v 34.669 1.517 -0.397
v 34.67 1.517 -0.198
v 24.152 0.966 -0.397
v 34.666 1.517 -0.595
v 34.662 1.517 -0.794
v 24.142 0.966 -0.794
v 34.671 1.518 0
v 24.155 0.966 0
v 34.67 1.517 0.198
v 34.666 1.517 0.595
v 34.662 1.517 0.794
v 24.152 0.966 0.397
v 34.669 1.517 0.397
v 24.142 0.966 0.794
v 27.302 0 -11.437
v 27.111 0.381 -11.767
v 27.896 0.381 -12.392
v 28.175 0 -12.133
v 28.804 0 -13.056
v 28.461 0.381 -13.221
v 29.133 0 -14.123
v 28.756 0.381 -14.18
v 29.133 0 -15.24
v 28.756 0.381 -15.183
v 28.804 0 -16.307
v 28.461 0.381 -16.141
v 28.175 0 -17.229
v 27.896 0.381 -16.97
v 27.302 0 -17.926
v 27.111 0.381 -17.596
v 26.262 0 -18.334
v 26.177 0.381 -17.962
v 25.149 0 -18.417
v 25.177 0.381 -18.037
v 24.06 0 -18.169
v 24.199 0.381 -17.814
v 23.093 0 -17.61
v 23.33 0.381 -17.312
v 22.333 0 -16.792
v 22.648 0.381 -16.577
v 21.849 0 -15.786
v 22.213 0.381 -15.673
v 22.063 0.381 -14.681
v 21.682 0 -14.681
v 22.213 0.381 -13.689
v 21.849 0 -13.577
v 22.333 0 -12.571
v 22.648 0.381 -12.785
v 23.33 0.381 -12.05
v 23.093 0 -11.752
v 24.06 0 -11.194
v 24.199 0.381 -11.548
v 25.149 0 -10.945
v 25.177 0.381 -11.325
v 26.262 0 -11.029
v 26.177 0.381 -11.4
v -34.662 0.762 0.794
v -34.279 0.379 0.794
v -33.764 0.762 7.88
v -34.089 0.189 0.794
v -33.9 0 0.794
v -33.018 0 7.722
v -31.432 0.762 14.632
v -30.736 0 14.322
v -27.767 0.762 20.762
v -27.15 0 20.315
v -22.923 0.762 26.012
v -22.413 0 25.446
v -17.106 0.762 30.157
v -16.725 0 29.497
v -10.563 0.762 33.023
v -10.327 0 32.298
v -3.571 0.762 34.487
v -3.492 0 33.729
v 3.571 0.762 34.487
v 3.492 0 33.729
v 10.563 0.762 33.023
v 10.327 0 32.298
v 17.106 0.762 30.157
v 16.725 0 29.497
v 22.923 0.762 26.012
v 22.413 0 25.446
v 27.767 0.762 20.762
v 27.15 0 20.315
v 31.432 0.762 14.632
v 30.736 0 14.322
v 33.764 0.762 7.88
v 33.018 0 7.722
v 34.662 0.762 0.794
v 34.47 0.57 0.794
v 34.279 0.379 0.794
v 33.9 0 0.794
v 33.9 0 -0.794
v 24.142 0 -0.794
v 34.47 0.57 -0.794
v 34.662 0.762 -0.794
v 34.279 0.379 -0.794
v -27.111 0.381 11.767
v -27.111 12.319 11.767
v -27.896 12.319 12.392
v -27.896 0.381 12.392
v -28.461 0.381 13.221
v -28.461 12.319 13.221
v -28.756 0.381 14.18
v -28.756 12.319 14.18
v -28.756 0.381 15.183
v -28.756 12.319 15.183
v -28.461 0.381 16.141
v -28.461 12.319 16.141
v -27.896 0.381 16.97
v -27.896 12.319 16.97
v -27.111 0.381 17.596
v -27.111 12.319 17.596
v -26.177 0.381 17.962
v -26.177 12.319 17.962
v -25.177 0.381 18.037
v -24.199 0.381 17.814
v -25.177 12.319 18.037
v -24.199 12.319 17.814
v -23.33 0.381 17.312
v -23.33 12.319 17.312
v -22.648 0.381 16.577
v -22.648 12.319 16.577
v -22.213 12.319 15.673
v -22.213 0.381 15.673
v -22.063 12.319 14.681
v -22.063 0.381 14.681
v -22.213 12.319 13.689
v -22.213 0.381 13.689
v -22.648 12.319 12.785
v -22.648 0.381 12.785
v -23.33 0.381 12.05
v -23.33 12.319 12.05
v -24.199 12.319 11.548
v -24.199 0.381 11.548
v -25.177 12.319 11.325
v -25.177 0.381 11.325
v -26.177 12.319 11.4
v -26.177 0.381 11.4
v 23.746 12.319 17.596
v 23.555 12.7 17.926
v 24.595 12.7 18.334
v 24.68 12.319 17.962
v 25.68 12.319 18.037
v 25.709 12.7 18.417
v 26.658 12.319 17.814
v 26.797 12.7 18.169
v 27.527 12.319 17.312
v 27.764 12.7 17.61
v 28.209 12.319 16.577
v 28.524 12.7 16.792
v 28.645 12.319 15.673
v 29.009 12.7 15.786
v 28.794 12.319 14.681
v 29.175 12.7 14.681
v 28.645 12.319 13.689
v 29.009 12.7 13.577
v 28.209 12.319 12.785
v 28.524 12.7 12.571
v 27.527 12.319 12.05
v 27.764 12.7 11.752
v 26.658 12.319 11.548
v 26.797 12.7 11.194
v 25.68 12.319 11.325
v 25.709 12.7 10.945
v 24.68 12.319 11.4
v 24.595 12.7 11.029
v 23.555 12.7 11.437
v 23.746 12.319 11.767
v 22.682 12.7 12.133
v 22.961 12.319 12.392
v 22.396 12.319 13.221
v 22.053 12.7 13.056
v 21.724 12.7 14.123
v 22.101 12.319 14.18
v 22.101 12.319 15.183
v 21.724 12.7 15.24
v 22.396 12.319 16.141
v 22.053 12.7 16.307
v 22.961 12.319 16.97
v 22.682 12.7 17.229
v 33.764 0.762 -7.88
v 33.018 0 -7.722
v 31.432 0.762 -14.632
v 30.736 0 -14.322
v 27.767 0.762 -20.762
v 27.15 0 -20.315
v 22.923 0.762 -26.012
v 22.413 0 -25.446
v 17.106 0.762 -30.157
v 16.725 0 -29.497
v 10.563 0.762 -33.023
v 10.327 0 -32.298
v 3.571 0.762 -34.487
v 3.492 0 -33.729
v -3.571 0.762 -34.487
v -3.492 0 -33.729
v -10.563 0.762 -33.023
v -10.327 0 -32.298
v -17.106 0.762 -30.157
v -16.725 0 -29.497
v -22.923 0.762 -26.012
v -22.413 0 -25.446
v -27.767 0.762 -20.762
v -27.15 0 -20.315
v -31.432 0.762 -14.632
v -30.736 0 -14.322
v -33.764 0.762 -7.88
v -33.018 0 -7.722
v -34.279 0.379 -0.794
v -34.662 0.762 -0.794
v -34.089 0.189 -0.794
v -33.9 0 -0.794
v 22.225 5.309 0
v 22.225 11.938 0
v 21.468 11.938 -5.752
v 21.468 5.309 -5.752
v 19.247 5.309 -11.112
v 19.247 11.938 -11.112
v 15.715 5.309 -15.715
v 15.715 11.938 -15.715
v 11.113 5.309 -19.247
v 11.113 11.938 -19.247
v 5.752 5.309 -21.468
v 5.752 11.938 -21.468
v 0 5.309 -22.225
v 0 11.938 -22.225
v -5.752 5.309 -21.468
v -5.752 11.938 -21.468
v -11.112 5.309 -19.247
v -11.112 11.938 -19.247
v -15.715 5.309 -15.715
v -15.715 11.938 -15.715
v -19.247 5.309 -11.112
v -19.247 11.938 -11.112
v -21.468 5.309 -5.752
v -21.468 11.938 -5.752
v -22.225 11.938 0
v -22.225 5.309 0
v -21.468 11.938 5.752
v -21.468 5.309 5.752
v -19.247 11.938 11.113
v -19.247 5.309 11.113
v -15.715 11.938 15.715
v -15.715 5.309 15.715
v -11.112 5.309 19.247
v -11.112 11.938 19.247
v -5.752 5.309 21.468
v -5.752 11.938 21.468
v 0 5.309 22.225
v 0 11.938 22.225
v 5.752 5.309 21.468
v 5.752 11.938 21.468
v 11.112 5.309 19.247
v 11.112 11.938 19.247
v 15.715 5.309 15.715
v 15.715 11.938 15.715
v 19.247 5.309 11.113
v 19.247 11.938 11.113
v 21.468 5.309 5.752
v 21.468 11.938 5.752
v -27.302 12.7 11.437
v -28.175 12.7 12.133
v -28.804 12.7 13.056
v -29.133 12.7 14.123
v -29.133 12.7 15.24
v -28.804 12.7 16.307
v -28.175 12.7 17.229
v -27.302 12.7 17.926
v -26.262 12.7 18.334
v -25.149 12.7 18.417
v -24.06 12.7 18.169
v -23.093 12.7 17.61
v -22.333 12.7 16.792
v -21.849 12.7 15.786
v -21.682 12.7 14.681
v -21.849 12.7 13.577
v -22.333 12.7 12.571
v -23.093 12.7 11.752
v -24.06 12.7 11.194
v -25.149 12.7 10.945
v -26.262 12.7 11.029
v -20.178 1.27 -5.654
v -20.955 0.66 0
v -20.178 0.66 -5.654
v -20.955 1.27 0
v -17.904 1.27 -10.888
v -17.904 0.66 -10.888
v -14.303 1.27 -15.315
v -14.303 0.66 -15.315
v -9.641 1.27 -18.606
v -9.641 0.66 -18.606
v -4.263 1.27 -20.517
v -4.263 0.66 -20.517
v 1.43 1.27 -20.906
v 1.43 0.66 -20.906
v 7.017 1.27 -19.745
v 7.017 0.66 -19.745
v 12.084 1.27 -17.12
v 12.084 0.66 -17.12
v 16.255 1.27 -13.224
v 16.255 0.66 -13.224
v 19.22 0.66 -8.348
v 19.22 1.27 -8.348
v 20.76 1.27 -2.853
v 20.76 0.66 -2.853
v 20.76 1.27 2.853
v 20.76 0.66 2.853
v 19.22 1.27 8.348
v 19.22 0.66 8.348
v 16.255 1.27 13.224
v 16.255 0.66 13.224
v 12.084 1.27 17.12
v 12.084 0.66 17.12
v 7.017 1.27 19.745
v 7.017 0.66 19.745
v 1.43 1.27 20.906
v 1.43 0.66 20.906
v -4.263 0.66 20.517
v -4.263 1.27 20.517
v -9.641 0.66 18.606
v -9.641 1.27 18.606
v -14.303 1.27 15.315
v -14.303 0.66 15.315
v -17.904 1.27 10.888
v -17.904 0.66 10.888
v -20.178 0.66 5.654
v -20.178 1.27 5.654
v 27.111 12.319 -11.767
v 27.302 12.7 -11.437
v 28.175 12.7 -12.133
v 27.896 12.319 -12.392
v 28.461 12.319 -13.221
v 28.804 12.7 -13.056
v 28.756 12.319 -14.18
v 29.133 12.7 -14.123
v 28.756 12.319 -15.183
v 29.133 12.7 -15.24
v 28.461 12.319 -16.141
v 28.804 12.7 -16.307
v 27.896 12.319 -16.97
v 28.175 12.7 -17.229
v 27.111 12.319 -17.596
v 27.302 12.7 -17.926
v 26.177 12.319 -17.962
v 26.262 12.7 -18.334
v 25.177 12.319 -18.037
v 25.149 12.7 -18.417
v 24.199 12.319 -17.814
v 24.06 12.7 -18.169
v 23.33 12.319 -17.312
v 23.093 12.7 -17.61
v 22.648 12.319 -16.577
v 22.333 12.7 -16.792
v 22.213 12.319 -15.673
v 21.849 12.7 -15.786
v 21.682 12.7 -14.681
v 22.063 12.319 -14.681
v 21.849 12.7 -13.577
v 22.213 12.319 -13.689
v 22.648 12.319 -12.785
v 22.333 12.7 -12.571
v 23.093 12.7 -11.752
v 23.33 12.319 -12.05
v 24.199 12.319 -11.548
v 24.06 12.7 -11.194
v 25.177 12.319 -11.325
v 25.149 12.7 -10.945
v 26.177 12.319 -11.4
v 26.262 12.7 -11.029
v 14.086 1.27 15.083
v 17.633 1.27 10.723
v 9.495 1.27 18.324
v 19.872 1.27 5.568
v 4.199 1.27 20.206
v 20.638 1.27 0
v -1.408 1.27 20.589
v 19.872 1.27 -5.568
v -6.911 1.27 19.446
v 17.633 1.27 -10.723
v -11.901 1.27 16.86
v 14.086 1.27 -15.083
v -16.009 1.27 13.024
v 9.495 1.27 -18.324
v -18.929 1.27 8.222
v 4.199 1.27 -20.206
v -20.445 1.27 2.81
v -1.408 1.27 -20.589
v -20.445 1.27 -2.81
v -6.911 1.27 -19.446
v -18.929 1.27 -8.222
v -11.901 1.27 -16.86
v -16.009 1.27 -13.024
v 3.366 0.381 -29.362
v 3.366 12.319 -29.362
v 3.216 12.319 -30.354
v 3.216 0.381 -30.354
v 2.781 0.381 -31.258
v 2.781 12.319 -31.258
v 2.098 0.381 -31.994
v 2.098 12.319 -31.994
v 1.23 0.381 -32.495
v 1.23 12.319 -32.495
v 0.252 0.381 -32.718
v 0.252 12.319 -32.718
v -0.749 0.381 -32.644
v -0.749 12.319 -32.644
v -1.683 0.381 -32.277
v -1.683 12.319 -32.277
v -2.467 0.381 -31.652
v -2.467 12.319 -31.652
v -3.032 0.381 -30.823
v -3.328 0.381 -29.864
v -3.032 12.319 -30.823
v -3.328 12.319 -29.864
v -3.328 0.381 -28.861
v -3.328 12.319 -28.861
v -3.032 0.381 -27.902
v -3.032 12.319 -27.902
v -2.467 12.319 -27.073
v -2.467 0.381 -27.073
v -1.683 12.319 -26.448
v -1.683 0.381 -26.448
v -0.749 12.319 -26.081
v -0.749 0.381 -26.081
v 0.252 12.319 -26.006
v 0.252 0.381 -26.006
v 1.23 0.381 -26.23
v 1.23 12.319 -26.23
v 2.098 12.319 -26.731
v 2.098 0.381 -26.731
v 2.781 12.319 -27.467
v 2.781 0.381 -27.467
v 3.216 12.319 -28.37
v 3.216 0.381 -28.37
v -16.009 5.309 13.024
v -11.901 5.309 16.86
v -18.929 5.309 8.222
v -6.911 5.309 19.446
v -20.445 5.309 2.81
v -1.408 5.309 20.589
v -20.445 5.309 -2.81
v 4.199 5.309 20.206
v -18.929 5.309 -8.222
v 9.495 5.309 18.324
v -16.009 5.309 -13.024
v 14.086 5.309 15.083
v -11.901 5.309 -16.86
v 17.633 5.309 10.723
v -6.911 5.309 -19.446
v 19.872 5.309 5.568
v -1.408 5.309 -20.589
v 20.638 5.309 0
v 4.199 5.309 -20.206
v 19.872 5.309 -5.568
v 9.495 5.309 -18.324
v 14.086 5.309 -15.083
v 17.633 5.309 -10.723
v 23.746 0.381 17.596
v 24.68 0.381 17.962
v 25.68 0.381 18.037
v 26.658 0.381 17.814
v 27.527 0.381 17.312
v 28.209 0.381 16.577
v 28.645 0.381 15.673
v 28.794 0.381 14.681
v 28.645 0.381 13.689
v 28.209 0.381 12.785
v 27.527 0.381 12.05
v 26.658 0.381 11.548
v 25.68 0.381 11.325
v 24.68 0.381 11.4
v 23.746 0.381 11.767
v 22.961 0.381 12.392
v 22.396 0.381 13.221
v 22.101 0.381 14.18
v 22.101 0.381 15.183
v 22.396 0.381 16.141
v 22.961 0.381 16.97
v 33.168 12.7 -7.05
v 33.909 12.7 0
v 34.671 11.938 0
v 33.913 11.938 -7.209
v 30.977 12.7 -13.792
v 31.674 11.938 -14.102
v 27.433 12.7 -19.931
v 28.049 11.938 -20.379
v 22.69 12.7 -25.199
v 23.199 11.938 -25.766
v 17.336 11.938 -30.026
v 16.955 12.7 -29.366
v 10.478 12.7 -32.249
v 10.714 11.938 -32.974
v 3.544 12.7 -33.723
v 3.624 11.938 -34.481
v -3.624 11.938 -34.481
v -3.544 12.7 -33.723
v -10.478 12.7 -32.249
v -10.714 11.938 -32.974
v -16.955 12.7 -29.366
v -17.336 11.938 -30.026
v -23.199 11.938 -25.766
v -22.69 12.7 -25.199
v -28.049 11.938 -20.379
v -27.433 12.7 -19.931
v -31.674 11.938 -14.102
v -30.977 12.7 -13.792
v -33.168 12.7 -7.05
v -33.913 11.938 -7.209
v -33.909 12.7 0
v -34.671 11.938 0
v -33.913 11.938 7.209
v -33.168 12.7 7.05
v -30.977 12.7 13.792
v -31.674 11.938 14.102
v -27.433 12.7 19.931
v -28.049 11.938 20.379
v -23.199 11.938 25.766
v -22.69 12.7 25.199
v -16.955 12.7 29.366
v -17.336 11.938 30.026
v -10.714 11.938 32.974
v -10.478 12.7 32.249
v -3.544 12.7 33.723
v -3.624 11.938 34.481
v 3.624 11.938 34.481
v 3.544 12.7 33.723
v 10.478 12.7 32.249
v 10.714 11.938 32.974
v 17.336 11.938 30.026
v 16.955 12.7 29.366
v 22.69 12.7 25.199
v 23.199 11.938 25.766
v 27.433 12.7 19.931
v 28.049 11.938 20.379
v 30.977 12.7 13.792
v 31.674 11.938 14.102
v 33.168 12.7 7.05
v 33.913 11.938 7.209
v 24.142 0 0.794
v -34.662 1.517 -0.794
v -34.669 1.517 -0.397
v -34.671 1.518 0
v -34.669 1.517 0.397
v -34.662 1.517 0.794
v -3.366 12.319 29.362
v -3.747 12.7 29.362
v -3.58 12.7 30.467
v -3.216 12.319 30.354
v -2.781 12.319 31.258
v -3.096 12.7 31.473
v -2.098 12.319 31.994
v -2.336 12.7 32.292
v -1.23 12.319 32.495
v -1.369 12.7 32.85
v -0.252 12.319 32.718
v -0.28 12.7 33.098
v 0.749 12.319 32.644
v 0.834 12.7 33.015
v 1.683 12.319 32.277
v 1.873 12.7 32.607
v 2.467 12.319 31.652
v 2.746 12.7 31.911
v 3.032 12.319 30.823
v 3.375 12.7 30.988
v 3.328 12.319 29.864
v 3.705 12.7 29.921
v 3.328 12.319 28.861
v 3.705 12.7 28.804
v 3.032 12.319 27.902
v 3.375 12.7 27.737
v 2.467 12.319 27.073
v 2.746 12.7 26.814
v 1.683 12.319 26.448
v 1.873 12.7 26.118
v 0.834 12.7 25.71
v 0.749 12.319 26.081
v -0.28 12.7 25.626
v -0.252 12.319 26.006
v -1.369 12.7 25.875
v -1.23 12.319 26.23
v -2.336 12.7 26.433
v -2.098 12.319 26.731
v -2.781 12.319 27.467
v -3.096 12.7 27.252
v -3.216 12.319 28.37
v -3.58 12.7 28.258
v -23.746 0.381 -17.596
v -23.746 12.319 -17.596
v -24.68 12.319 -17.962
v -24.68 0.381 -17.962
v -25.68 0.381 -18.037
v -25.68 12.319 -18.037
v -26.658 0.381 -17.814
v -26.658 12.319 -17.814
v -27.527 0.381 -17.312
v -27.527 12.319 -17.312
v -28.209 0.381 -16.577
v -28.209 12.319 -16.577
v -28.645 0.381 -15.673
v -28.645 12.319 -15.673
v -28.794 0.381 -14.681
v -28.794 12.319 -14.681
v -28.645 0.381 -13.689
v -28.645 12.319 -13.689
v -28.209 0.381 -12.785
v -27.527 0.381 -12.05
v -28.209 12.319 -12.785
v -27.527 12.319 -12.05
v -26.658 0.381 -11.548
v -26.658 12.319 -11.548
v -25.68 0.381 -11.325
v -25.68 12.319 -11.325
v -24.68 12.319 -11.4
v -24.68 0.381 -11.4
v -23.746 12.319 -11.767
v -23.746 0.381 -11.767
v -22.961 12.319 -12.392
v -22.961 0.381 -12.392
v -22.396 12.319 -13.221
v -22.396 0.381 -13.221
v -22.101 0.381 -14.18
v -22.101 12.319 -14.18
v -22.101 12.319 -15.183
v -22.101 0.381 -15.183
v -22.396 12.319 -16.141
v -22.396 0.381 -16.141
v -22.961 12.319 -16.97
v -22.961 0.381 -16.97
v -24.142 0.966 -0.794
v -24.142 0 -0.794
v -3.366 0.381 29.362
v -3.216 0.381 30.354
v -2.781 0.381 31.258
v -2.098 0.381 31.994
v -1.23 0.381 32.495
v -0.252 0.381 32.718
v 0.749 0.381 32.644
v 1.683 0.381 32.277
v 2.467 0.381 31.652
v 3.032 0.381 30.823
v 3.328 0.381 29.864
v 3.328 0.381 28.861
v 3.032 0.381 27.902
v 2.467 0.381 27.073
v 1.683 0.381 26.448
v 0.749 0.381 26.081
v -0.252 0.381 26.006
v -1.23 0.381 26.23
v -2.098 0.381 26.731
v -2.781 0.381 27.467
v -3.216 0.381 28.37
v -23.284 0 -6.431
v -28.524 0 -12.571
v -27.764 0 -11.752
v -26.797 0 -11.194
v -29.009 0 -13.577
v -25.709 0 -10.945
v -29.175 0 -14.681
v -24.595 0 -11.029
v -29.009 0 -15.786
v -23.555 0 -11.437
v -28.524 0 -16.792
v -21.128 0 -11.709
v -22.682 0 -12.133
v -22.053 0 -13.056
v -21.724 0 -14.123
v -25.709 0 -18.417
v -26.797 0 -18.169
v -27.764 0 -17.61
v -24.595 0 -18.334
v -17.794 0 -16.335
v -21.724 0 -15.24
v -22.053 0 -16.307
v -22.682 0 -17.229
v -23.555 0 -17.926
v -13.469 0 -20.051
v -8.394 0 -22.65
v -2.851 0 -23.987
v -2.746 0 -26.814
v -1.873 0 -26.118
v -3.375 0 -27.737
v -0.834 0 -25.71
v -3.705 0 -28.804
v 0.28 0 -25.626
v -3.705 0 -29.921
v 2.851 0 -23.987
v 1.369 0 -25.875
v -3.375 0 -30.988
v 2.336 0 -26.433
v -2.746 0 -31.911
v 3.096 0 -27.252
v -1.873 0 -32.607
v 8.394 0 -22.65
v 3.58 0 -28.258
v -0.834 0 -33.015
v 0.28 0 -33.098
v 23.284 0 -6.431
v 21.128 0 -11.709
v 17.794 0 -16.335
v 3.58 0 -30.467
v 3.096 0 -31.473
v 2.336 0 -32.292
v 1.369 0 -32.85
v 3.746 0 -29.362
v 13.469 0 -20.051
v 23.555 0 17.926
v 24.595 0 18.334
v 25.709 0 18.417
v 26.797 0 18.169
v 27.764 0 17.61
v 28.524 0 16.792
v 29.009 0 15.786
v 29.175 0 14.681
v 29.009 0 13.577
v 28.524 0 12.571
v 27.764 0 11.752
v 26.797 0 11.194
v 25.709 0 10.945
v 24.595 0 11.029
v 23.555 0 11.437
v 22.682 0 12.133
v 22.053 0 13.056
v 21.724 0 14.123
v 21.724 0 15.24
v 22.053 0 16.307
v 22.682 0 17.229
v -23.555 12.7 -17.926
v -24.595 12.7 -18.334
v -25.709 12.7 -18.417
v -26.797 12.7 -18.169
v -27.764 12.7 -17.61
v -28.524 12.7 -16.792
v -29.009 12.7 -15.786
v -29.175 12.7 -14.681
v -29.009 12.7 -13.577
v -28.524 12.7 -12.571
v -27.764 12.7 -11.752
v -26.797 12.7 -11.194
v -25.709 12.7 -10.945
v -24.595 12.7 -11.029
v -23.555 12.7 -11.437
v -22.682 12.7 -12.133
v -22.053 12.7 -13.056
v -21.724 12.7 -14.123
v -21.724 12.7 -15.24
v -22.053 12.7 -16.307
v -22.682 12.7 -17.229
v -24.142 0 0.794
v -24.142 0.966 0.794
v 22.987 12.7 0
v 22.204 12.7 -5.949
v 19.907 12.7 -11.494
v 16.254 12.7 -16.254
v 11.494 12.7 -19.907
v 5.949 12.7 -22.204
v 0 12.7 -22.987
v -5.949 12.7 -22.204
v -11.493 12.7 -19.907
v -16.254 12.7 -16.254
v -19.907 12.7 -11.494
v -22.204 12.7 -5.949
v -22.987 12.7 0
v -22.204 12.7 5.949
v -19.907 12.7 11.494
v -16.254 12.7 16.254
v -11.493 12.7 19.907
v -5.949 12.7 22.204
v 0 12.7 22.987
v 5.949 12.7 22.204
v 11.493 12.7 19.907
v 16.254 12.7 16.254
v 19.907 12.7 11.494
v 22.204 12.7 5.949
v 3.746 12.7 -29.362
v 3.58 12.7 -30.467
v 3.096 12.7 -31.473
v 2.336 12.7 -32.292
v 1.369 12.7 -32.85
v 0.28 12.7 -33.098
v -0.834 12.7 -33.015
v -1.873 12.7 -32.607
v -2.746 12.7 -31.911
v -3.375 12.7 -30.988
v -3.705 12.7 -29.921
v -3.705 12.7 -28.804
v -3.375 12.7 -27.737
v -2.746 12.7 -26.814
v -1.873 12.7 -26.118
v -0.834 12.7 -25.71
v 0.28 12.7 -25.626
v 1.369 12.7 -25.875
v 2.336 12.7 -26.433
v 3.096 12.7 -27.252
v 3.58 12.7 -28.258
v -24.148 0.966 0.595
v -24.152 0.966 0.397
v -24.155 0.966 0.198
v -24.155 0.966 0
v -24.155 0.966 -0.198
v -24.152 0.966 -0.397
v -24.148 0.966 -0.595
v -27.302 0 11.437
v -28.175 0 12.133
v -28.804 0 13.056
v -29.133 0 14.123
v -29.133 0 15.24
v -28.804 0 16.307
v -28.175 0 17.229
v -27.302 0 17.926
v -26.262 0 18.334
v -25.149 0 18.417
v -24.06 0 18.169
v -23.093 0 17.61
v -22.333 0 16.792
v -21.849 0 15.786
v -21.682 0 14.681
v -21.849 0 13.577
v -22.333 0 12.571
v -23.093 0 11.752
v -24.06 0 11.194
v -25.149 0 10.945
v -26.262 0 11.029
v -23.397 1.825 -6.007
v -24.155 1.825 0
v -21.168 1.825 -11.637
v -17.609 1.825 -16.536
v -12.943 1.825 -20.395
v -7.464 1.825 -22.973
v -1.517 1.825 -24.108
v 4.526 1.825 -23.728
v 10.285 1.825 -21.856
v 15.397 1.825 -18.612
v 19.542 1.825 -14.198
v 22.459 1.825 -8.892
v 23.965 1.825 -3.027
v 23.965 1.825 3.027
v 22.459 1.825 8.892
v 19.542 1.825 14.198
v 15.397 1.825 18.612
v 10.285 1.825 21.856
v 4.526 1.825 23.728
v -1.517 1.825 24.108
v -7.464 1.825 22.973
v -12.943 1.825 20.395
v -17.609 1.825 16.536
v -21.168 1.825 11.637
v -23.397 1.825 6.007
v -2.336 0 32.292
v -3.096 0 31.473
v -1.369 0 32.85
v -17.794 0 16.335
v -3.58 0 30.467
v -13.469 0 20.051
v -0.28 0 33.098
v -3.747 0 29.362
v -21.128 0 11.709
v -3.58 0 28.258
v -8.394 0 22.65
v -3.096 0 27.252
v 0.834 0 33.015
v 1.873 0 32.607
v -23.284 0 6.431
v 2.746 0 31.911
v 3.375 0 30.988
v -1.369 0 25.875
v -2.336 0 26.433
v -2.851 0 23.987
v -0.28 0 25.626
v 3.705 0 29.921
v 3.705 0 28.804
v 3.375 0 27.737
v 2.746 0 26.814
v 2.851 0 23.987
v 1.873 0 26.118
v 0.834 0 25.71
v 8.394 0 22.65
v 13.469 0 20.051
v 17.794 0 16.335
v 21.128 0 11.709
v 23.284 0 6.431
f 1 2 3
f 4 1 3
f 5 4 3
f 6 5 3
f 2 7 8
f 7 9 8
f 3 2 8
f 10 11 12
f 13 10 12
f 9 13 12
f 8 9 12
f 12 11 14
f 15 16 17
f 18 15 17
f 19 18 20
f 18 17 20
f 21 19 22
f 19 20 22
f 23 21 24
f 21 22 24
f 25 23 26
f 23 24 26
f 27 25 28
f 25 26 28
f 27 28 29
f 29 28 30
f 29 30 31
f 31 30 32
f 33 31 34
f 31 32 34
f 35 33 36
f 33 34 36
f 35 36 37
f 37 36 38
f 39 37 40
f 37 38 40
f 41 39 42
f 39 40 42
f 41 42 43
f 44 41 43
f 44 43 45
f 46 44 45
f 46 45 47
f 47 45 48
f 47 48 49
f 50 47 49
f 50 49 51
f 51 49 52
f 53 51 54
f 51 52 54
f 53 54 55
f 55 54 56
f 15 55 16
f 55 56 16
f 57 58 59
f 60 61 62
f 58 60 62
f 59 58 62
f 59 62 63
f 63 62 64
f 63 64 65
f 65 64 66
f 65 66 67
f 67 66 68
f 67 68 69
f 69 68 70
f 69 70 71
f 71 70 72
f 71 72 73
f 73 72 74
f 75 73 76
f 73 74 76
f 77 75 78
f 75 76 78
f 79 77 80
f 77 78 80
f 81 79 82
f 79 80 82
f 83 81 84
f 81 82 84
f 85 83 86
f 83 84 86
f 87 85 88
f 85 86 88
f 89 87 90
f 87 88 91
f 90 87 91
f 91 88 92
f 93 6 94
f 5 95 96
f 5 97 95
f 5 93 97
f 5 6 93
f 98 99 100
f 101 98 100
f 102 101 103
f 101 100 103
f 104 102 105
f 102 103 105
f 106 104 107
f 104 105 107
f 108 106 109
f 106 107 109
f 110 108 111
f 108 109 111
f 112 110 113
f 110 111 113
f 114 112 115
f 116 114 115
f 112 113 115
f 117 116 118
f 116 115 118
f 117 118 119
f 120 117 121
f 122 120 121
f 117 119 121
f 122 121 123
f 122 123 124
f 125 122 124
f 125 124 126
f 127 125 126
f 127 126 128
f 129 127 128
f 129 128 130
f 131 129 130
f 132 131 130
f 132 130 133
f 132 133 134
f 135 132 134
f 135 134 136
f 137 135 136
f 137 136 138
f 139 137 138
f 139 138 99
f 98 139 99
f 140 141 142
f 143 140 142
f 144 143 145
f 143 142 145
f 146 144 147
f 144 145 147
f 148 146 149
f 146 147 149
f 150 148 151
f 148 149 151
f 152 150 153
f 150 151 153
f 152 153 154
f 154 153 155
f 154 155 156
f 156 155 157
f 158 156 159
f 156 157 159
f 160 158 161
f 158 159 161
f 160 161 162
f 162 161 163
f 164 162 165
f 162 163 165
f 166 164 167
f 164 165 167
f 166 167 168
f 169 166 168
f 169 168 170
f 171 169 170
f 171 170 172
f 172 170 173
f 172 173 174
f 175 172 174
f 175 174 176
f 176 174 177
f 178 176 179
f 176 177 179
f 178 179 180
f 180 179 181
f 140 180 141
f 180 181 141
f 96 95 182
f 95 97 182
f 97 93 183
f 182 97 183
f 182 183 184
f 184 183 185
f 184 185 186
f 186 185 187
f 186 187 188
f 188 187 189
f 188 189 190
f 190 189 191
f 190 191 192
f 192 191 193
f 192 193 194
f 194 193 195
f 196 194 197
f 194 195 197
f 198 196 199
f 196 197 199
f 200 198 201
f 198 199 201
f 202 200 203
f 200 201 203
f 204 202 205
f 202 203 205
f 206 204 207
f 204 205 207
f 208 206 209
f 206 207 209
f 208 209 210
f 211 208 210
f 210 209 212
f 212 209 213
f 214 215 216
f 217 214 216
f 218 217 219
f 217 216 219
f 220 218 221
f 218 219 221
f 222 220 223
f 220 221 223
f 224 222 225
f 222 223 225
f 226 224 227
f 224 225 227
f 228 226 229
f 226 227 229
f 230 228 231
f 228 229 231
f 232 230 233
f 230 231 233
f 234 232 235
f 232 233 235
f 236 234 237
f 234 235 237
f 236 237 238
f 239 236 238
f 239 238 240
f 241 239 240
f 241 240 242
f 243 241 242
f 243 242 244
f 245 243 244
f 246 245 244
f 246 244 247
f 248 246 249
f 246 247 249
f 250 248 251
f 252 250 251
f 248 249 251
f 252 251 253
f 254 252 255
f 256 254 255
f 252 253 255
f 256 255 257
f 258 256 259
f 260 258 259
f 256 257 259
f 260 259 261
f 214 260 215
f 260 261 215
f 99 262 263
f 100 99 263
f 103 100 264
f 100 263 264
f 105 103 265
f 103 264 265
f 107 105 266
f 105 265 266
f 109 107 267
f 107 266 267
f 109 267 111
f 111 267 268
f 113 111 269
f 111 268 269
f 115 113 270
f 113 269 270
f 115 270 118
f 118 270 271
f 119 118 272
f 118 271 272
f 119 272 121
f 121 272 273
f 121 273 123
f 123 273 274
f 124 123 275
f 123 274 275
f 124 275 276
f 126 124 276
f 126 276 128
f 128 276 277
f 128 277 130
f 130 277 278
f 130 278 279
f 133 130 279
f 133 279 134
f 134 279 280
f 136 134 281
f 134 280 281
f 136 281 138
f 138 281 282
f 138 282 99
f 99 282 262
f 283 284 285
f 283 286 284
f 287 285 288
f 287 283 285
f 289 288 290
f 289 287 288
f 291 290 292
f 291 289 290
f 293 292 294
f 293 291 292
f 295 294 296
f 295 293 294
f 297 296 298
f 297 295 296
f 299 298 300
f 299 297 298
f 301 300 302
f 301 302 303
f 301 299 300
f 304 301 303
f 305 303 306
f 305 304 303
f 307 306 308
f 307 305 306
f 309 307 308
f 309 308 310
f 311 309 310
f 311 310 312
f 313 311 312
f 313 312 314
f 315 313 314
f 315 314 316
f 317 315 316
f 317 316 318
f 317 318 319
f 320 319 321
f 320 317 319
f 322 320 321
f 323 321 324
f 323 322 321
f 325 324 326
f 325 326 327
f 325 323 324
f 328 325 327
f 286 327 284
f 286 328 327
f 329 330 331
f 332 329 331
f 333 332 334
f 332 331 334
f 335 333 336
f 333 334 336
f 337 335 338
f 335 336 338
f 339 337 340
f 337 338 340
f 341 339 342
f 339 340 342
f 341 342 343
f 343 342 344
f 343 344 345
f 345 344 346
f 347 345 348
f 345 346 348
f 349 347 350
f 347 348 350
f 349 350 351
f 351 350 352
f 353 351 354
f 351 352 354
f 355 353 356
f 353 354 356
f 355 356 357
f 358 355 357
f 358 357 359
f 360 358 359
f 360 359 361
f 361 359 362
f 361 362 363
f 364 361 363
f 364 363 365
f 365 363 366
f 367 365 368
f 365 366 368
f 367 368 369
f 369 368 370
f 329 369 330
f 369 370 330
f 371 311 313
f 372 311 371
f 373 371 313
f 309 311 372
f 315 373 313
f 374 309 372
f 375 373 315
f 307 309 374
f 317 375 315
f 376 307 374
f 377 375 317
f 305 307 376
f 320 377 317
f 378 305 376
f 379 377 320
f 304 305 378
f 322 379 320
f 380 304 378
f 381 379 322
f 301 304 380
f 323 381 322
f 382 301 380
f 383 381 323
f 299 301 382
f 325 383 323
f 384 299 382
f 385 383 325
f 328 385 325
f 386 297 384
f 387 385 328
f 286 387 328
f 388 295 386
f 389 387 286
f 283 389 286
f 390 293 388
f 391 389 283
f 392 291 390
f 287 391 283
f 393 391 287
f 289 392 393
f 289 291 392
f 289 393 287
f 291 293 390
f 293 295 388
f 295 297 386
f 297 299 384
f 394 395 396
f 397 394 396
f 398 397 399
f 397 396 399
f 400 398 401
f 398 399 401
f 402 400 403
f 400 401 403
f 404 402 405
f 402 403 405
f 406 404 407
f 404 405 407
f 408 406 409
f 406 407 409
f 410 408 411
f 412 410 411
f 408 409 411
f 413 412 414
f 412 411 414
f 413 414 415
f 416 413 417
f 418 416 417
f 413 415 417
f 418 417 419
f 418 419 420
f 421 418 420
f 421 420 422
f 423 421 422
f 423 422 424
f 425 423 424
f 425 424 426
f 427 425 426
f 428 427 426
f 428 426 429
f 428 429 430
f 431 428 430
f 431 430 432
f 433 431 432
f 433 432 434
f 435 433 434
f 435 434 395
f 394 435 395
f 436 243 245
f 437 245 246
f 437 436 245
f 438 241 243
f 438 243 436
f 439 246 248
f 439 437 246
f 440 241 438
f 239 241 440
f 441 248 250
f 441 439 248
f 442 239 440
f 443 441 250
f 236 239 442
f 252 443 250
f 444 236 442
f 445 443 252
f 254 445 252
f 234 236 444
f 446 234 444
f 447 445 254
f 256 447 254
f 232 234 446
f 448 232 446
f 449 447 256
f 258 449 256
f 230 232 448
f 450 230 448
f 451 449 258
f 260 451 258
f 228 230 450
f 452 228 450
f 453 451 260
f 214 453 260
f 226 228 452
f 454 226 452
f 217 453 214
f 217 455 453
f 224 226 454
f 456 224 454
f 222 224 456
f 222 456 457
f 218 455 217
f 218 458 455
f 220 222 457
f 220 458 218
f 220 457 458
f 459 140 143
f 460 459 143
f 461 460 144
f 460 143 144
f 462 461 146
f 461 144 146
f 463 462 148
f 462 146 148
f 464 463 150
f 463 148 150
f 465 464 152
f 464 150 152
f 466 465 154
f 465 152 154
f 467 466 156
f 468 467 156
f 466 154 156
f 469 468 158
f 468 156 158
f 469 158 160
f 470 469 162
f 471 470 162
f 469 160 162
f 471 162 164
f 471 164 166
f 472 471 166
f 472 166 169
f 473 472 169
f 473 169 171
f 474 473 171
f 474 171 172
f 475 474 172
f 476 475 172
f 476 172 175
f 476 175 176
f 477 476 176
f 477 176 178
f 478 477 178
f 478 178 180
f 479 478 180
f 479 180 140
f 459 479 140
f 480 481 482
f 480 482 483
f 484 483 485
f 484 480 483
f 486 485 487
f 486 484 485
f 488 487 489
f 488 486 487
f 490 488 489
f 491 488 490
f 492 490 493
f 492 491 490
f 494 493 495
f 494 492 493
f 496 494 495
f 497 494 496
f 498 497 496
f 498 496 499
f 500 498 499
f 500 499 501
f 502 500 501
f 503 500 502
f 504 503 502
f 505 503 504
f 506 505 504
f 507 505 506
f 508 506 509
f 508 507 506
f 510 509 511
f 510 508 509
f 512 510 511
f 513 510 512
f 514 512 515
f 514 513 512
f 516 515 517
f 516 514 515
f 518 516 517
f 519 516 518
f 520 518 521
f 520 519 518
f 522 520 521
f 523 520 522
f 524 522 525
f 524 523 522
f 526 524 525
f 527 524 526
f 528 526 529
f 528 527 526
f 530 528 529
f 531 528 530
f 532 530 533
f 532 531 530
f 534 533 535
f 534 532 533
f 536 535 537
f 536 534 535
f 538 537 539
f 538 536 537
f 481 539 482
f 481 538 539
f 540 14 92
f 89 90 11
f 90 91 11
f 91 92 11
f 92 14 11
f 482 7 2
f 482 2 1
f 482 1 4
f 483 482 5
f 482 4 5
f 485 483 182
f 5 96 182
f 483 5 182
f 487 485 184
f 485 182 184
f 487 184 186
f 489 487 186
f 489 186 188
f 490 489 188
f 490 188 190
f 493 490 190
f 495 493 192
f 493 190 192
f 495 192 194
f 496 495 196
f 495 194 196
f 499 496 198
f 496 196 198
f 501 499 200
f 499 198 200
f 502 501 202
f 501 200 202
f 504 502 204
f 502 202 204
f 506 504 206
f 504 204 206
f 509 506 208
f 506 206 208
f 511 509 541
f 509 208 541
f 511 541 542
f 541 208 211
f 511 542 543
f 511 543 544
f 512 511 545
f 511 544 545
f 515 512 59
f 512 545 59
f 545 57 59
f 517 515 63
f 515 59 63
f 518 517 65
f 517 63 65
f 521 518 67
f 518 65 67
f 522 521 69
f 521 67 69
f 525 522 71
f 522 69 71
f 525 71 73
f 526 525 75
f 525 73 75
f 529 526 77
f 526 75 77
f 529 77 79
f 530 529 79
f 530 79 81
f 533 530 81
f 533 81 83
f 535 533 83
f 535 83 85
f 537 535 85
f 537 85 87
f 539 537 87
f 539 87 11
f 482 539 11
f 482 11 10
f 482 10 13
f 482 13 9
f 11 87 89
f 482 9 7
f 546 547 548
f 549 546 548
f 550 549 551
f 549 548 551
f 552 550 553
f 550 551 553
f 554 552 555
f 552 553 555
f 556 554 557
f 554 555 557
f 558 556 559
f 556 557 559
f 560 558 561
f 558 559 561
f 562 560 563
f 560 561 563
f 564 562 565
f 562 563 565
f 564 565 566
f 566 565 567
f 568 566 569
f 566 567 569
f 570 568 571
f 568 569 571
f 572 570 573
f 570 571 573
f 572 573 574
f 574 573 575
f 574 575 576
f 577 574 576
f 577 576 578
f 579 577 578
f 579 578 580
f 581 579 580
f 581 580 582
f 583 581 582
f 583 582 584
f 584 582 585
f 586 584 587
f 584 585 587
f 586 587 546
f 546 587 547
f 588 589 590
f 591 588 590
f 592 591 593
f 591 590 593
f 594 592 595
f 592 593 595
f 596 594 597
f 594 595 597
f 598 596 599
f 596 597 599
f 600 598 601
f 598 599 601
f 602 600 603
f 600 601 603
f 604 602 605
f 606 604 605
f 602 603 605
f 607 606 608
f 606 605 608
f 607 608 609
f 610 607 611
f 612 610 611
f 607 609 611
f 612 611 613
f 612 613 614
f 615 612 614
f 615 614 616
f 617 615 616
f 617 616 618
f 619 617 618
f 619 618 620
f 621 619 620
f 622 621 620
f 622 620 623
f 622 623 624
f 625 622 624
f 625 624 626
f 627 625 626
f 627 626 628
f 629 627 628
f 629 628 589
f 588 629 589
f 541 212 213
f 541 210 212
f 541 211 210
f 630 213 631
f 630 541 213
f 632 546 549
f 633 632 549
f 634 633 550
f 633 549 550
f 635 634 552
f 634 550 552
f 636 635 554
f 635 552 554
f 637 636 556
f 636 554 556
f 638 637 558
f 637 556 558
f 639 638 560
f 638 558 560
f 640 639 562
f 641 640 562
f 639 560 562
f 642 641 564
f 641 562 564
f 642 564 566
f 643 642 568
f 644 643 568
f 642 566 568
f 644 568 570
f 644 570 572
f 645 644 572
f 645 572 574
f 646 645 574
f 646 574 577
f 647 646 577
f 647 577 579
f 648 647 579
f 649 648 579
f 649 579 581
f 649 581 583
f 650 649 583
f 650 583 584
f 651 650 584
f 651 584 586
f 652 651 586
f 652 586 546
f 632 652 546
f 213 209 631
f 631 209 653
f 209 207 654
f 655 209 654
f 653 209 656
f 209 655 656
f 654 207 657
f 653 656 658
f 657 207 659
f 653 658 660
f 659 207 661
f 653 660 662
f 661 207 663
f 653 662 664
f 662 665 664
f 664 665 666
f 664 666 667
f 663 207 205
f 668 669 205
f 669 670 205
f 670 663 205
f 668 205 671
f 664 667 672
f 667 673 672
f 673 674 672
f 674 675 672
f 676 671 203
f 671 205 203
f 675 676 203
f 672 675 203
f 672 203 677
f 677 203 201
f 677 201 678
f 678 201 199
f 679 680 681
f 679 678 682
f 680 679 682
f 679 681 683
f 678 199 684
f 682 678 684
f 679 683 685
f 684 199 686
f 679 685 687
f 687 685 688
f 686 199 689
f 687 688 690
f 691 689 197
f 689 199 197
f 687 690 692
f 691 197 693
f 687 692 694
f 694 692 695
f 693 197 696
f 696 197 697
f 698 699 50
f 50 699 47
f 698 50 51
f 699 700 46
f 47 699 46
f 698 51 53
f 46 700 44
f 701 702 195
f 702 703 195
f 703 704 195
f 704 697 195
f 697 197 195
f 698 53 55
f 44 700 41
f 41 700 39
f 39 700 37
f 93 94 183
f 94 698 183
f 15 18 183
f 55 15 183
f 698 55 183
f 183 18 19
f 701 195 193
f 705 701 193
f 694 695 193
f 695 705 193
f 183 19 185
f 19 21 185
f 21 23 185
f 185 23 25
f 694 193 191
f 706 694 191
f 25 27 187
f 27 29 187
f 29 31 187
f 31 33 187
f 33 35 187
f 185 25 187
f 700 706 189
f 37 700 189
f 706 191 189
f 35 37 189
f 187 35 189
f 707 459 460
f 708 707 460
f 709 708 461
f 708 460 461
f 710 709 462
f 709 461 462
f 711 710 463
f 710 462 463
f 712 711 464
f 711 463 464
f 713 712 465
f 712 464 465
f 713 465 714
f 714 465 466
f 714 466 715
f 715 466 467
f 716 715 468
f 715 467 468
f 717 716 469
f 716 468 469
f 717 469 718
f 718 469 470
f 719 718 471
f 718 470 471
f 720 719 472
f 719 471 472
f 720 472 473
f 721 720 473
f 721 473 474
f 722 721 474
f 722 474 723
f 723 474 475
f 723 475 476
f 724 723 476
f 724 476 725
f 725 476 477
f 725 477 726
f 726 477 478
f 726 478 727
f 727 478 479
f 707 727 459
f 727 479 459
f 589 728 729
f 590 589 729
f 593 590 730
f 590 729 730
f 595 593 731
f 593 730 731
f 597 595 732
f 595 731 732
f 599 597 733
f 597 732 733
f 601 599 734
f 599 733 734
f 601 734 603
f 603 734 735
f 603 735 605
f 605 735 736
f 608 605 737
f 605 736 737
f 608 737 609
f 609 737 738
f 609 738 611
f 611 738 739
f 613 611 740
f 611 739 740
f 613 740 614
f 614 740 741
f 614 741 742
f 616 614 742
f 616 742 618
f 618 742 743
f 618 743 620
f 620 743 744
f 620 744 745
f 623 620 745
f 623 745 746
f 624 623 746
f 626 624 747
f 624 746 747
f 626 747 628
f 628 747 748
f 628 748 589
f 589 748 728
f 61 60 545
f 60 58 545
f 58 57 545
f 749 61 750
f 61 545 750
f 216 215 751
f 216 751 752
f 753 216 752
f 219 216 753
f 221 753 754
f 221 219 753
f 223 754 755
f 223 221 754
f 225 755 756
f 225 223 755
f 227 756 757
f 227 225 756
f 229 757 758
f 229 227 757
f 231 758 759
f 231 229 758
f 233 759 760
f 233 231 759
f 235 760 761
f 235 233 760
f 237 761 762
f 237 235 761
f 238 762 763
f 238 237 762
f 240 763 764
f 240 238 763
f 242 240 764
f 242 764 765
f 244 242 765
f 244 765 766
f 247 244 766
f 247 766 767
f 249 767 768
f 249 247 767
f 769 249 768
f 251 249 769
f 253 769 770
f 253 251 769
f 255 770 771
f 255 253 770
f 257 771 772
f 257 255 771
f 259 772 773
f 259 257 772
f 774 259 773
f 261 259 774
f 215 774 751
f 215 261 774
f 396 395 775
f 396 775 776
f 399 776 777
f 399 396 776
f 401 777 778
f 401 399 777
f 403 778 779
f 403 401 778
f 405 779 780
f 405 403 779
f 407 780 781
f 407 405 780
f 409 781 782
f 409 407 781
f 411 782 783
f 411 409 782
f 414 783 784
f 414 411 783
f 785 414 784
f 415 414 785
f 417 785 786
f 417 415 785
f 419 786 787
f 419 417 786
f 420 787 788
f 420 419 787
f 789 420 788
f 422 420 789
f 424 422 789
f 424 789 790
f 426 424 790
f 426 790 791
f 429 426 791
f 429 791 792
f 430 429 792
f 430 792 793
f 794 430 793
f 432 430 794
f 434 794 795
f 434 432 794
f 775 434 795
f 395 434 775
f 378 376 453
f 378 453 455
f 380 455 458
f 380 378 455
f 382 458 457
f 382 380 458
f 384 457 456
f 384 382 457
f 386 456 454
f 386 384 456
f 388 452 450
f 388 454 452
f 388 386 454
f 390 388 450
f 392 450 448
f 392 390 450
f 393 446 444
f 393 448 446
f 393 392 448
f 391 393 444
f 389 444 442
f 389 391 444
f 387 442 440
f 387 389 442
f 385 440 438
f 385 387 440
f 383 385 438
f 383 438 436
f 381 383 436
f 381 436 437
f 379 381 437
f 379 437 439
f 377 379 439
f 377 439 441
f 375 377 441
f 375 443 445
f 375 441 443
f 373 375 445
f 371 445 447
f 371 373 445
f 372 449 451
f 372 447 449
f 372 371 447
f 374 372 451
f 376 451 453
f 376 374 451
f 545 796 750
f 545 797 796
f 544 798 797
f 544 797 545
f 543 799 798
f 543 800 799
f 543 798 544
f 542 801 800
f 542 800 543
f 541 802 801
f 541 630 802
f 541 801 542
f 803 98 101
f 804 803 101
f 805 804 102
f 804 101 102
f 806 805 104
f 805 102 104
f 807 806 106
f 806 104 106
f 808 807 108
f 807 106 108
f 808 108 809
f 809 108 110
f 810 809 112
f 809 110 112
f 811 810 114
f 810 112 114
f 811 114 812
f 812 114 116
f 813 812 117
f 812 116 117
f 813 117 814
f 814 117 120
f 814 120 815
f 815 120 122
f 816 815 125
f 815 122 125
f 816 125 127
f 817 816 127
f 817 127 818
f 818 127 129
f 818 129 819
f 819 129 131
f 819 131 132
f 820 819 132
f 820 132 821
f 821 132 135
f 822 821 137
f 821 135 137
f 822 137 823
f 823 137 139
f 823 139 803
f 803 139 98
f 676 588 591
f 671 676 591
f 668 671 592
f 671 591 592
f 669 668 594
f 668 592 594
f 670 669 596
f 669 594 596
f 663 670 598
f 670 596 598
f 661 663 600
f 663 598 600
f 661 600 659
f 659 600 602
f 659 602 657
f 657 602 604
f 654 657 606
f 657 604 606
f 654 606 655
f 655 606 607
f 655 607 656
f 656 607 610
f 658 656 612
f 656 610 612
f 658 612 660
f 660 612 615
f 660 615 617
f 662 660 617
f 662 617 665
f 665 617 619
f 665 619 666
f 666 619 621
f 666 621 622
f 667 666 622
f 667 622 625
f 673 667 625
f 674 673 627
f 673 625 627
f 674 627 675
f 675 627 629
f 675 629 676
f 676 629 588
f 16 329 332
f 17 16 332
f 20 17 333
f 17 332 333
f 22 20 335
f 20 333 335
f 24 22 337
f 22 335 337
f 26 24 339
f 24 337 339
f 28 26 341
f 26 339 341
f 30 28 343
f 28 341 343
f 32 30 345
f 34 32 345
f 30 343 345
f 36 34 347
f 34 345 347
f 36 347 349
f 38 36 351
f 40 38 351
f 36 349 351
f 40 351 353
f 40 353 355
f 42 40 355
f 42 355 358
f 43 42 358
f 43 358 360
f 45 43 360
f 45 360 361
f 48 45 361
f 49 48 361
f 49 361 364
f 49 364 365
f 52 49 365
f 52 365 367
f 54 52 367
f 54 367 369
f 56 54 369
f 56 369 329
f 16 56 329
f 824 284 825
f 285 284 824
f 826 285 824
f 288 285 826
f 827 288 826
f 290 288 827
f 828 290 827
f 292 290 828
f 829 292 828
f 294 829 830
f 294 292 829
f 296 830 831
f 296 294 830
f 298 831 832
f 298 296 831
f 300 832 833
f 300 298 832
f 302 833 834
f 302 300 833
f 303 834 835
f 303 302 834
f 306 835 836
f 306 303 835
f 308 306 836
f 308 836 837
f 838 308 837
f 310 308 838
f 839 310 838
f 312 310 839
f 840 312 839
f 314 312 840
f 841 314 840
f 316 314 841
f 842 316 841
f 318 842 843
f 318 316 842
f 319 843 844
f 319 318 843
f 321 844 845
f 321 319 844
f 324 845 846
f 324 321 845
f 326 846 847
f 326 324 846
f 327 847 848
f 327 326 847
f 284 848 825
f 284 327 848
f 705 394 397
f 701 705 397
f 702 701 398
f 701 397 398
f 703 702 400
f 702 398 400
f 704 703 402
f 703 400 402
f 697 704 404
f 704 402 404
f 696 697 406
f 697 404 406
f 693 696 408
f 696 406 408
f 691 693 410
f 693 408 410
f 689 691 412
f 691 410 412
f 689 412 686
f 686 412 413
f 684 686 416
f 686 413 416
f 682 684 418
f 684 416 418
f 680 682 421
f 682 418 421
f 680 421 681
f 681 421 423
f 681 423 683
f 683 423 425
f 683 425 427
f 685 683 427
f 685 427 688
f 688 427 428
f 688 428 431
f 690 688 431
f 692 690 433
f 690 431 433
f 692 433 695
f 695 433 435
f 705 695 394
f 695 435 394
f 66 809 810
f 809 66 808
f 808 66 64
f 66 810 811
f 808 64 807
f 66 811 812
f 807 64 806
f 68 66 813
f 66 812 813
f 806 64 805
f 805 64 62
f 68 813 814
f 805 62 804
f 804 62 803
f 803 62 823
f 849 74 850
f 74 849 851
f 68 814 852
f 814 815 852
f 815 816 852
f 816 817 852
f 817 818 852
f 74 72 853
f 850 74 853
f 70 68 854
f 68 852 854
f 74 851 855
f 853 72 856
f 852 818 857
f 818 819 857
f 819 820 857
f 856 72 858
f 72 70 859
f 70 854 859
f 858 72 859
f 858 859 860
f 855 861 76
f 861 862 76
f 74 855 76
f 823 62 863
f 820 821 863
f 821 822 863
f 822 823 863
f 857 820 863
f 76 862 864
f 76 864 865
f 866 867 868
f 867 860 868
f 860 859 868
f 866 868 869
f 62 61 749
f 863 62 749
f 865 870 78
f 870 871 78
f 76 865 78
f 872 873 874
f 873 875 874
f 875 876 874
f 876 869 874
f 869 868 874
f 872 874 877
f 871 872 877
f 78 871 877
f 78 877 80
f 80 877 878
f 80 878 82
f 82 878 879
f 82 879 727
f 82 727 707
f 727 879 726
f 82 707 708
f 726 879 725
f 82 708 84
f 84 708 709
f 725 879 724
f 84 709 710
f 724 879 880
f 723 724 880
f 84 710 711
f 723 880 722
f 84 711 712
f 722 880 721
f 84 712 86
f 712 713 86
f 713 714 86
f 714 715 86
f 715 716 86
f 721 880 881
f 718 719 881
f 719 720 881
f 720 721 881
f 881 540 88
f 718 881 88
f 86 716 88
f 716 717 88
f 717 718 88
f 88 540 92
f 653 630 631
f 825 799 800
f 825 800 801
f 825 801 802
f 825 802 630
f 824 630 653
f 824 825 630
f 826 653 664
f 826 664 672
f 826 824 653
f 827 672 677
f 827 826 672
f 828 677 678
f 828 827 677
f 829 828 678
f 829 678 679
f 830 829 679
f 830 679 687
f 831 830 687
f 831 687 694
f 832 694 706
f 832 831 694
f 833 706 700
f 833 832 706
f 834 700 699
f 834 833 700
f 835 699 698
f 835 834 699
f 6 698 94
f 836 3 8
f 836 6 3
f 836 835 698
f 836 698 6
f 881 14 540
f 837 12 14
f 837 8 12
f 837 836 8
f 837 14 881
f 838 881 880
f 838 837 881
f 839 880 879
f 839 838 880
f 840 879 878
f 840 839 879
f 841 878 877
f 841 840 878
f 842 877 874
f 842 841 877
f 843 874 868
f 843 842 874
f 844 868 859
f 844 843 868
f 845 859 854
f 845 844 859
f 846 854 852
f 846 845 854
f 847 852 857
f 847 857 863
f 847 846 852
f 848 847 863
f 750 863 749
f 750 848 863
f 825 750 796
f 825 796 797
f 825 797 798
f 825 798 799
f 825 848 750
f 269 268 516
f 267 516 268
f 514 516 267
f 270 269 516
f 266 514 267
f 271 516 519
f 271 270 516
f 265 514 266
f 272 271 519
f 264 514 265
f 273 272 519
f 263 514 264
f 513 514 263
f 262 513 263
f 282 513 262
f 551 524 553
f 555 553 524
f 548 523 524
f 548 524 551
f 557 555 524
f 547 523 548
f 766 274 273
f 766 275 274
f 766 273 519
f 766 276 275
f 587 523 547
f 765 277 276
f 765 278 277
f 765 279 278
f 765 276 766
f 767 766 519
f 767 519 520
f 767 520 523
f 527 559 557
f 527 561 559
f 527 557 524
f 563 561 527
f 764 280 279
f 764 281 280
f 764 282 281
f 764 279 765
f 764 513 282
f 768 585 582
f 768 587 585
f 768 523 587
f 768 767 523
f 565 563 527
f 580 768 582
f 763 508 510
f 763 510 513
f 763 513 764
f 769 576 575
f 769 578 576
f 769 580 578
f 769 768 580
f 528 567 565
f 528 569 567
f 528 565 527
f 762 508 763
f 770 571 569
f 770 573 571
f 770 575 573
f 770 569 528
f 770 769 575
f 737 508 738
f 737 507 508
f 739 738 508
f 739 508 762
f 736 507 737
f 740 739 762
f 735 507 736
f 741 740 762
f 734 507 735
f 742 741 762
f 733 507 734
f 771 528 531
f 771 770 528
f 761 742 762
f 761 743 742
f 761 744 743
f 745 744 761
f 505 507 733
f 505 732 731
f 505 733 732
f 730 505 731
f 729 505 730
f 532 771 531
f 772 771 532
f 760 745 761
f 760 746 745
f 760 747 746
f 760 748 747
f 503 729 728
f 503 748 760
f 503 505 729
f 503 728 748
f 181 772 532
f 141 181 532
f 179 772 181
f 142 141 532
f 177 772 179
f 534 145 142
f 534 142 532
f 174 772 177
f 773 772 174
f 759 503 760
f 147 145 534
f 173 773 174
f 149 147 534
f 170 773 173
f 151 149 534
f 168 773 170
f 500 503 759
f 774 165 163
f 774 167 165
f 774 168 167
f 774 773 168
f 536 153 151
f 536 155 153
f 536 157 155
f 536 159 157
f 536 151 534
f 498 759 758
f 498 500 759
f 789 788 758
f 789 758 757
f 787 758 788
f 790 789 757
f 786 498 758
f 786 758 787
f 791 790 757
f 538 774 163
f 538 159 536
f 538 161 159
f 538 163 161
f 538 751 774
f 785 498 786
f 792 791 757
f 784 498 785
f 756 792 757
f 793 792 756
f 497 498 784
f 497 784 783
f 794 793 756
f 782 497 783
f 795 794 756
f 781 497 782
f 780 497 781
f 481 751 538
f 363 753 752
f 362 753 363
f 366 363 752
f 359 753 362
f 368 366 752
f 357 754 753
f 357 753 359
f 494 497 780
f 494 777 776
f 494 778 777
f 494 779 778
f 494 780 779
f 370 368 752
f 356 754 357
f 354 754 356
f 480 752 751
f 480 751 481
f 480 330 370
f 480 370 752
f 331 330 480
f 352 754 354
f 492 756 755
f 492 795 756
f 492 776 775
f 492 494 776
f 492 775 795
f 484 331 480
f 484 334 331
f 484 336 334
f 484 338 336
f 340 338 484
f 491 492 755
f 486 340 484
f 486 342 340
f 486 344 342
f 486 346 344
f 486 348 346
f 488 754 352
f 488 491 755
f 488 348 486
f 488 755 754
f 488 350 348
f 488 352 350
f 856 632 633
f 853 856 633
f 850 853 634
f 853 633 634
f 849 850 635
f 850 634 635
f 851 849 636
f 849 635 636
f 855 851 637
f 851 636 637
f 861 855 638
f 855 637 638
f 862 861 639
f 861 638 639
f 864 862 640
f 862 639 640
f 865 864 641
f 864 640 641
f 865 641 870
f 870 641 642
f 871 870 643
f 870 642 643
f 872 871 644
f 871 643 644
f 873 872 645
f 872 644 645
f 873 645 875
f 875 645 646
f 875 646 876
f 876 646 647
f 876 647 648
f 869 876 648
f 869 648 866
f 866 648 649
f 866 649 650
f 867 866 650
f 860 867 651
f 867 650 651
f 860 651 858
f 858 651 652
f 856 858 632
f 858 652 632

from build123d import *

# Parameters (mm, degrees)
SKETCH1_R                    = 34.671
SKETCH1_R_2                  = 20.6375
BOSS_EXTRUDE1_DEPTH          = 12.7
SKETCH2_R                    = 22.225
CUT_EXTRUDE1_DEPTH           = 7.3914
CHAMFER1_SIZE                = 0.762
SKETCH4_R                    = 3.3655
CUT_EXTRUDE2_DEPTH           = 13.7
CHAMFER2_SIZE                = 0.381
CIRPATTERN1_COUNT            = 6
CHAMFER2_OF_CIRPATTERN1_SIZE = 0.381
CUT_EXTRUDE3_DEPTH           = 0.79375


with BuildPart() as part:
    # Sketch1 → Boss-Extrude1 (new body)
    with BuildSketch(Plane(origin=(0, 0, 0), x_dir=(1, 0, 0), z_dir=(0, 1, 0))):
        Circle(SKETCH1_R)
        Circle(SKETCH1_R_2, mode=Mode.SUBTRACT)
    extrude(amount=BOSS_EXTRUDE1_DEPTH)

    # Sketch2 → Cut-Extrude1 (cut)
    with BuildSketch(Plane(origin=(0, 12.7, 0), x_dir=(1, 0, 0), z_dir=(0, 1, 0))):
        Circle(SKETCH2_R)
    extrude(amount=-CUT_EXTRUDE1_DEPTH, mode=Mode.SUBTRACT)

    # Chamfer1
    chamfer1_edges = [part.edges().sort_by_distance(p)[0] for p in [
        (-22.225, 12.7, 0),
        (-34.671, 0, 0),
        (-34.671, 12.7, 0),
    ]]
    chamfer(chamfer1_edges, length=CHAMFER1_SIZE)

    # Sketch3 → Cut-Revolve1 (revolve, cut)
    with BuildSketch(Plane.XY):
        Polygon((-24.1554, 0), (-24.1554, 1.825244), (-20.955, 0.6604), (-20.955, 1.27), (0, 1.27), (0, 0), align=None)
    revolve(axis=Axis((0, 12.7, 0), (0, -1, 0)), mode=Mode.SUBTRACT)

    # Sketch4 → Cut-Extrude2 (cut, through all)
    with BuildSketch(Plane(origin=(0, 12.7, 0), x_dir=(1, 0, 0), z_dir=(0, 1, 0))):
        with Locations((0, 29.3624)):
            Circle(SKETCH4_R)
    cut_extrude2 = extrude(amount=-CUT_EXTRUDE2_DEPTH, mode=Mode.SUBTRACT)

    # Chamfer2
    chamfer2_edges = [part.edges().sort_by_distance(p)[0] for p in [
        (-3.3655, 0, -29.3624),
        (-3.3655, 12.7, -29.3624),
    ]]
    chamfer(chamfer2_edges, length=CHAMFER2_SIZE)

    # CirPattern1: Cut-Extrude2 ×6 about axis
    cirpattern1_axis = Axis((0, 0, 0), (0, 1, 0))
    for i in range(1, CIRPATTERN1_COUNT):
        add(cut_extrude2.rotate(cirpattern1_axis, i * 360 / CIRPATTERN1_COUNT), mode=Mode.SUBTRACT)

    # Chamfer2 of CirPattern1
    chamfer2_of_cirpattern1_edges = [part.edges().sort_by_distance(p)[0] for p in [
        (-27.111334316, 0, -11.766591504),
        (-27.111334316, 12.7, -11.766591504),
        (-23.745834316, 0, 17.595808496),
        (-23.745834316, 12.7, 17.595808496),
        (3.3655, 0, 29.3624),
        (3.3655, 12.7, 29.3624),
        (27.111334316, 0, 11.766591504),
        (27.111334316, 12.7, 11.766591504),
        (23.745834316, 0, -17.595808496),
        (23.745834316, 12.7, -17.595808496),
    ]]
    chamfer(chamfer2_of_cirpattern1_edges, length=CHAMFER2_OF_CIRPATTERN1_SIZE)

    # Sketch5 → Cut-Extrude3 (cut, symmetric)
    with BuildSketch(Plane.XY):
        Polygon((-23.765182704, 0.94596365), (-35.869388854, 1.580318214), (-35.869388854, -0.2995168), (-23.765182704, -0.2995168), align=None)
        Polygon((23.765182704, 0.94596365), (23.765182704, -0.2995168), (35.869388854, -0.2995168), (35.869388854, 1.580318214), align=None)
    extrude(amount=CUT_EXTRUDE3_DEPTH, both=True, mode=Mode.SUBTRACT)


solid = part.part
